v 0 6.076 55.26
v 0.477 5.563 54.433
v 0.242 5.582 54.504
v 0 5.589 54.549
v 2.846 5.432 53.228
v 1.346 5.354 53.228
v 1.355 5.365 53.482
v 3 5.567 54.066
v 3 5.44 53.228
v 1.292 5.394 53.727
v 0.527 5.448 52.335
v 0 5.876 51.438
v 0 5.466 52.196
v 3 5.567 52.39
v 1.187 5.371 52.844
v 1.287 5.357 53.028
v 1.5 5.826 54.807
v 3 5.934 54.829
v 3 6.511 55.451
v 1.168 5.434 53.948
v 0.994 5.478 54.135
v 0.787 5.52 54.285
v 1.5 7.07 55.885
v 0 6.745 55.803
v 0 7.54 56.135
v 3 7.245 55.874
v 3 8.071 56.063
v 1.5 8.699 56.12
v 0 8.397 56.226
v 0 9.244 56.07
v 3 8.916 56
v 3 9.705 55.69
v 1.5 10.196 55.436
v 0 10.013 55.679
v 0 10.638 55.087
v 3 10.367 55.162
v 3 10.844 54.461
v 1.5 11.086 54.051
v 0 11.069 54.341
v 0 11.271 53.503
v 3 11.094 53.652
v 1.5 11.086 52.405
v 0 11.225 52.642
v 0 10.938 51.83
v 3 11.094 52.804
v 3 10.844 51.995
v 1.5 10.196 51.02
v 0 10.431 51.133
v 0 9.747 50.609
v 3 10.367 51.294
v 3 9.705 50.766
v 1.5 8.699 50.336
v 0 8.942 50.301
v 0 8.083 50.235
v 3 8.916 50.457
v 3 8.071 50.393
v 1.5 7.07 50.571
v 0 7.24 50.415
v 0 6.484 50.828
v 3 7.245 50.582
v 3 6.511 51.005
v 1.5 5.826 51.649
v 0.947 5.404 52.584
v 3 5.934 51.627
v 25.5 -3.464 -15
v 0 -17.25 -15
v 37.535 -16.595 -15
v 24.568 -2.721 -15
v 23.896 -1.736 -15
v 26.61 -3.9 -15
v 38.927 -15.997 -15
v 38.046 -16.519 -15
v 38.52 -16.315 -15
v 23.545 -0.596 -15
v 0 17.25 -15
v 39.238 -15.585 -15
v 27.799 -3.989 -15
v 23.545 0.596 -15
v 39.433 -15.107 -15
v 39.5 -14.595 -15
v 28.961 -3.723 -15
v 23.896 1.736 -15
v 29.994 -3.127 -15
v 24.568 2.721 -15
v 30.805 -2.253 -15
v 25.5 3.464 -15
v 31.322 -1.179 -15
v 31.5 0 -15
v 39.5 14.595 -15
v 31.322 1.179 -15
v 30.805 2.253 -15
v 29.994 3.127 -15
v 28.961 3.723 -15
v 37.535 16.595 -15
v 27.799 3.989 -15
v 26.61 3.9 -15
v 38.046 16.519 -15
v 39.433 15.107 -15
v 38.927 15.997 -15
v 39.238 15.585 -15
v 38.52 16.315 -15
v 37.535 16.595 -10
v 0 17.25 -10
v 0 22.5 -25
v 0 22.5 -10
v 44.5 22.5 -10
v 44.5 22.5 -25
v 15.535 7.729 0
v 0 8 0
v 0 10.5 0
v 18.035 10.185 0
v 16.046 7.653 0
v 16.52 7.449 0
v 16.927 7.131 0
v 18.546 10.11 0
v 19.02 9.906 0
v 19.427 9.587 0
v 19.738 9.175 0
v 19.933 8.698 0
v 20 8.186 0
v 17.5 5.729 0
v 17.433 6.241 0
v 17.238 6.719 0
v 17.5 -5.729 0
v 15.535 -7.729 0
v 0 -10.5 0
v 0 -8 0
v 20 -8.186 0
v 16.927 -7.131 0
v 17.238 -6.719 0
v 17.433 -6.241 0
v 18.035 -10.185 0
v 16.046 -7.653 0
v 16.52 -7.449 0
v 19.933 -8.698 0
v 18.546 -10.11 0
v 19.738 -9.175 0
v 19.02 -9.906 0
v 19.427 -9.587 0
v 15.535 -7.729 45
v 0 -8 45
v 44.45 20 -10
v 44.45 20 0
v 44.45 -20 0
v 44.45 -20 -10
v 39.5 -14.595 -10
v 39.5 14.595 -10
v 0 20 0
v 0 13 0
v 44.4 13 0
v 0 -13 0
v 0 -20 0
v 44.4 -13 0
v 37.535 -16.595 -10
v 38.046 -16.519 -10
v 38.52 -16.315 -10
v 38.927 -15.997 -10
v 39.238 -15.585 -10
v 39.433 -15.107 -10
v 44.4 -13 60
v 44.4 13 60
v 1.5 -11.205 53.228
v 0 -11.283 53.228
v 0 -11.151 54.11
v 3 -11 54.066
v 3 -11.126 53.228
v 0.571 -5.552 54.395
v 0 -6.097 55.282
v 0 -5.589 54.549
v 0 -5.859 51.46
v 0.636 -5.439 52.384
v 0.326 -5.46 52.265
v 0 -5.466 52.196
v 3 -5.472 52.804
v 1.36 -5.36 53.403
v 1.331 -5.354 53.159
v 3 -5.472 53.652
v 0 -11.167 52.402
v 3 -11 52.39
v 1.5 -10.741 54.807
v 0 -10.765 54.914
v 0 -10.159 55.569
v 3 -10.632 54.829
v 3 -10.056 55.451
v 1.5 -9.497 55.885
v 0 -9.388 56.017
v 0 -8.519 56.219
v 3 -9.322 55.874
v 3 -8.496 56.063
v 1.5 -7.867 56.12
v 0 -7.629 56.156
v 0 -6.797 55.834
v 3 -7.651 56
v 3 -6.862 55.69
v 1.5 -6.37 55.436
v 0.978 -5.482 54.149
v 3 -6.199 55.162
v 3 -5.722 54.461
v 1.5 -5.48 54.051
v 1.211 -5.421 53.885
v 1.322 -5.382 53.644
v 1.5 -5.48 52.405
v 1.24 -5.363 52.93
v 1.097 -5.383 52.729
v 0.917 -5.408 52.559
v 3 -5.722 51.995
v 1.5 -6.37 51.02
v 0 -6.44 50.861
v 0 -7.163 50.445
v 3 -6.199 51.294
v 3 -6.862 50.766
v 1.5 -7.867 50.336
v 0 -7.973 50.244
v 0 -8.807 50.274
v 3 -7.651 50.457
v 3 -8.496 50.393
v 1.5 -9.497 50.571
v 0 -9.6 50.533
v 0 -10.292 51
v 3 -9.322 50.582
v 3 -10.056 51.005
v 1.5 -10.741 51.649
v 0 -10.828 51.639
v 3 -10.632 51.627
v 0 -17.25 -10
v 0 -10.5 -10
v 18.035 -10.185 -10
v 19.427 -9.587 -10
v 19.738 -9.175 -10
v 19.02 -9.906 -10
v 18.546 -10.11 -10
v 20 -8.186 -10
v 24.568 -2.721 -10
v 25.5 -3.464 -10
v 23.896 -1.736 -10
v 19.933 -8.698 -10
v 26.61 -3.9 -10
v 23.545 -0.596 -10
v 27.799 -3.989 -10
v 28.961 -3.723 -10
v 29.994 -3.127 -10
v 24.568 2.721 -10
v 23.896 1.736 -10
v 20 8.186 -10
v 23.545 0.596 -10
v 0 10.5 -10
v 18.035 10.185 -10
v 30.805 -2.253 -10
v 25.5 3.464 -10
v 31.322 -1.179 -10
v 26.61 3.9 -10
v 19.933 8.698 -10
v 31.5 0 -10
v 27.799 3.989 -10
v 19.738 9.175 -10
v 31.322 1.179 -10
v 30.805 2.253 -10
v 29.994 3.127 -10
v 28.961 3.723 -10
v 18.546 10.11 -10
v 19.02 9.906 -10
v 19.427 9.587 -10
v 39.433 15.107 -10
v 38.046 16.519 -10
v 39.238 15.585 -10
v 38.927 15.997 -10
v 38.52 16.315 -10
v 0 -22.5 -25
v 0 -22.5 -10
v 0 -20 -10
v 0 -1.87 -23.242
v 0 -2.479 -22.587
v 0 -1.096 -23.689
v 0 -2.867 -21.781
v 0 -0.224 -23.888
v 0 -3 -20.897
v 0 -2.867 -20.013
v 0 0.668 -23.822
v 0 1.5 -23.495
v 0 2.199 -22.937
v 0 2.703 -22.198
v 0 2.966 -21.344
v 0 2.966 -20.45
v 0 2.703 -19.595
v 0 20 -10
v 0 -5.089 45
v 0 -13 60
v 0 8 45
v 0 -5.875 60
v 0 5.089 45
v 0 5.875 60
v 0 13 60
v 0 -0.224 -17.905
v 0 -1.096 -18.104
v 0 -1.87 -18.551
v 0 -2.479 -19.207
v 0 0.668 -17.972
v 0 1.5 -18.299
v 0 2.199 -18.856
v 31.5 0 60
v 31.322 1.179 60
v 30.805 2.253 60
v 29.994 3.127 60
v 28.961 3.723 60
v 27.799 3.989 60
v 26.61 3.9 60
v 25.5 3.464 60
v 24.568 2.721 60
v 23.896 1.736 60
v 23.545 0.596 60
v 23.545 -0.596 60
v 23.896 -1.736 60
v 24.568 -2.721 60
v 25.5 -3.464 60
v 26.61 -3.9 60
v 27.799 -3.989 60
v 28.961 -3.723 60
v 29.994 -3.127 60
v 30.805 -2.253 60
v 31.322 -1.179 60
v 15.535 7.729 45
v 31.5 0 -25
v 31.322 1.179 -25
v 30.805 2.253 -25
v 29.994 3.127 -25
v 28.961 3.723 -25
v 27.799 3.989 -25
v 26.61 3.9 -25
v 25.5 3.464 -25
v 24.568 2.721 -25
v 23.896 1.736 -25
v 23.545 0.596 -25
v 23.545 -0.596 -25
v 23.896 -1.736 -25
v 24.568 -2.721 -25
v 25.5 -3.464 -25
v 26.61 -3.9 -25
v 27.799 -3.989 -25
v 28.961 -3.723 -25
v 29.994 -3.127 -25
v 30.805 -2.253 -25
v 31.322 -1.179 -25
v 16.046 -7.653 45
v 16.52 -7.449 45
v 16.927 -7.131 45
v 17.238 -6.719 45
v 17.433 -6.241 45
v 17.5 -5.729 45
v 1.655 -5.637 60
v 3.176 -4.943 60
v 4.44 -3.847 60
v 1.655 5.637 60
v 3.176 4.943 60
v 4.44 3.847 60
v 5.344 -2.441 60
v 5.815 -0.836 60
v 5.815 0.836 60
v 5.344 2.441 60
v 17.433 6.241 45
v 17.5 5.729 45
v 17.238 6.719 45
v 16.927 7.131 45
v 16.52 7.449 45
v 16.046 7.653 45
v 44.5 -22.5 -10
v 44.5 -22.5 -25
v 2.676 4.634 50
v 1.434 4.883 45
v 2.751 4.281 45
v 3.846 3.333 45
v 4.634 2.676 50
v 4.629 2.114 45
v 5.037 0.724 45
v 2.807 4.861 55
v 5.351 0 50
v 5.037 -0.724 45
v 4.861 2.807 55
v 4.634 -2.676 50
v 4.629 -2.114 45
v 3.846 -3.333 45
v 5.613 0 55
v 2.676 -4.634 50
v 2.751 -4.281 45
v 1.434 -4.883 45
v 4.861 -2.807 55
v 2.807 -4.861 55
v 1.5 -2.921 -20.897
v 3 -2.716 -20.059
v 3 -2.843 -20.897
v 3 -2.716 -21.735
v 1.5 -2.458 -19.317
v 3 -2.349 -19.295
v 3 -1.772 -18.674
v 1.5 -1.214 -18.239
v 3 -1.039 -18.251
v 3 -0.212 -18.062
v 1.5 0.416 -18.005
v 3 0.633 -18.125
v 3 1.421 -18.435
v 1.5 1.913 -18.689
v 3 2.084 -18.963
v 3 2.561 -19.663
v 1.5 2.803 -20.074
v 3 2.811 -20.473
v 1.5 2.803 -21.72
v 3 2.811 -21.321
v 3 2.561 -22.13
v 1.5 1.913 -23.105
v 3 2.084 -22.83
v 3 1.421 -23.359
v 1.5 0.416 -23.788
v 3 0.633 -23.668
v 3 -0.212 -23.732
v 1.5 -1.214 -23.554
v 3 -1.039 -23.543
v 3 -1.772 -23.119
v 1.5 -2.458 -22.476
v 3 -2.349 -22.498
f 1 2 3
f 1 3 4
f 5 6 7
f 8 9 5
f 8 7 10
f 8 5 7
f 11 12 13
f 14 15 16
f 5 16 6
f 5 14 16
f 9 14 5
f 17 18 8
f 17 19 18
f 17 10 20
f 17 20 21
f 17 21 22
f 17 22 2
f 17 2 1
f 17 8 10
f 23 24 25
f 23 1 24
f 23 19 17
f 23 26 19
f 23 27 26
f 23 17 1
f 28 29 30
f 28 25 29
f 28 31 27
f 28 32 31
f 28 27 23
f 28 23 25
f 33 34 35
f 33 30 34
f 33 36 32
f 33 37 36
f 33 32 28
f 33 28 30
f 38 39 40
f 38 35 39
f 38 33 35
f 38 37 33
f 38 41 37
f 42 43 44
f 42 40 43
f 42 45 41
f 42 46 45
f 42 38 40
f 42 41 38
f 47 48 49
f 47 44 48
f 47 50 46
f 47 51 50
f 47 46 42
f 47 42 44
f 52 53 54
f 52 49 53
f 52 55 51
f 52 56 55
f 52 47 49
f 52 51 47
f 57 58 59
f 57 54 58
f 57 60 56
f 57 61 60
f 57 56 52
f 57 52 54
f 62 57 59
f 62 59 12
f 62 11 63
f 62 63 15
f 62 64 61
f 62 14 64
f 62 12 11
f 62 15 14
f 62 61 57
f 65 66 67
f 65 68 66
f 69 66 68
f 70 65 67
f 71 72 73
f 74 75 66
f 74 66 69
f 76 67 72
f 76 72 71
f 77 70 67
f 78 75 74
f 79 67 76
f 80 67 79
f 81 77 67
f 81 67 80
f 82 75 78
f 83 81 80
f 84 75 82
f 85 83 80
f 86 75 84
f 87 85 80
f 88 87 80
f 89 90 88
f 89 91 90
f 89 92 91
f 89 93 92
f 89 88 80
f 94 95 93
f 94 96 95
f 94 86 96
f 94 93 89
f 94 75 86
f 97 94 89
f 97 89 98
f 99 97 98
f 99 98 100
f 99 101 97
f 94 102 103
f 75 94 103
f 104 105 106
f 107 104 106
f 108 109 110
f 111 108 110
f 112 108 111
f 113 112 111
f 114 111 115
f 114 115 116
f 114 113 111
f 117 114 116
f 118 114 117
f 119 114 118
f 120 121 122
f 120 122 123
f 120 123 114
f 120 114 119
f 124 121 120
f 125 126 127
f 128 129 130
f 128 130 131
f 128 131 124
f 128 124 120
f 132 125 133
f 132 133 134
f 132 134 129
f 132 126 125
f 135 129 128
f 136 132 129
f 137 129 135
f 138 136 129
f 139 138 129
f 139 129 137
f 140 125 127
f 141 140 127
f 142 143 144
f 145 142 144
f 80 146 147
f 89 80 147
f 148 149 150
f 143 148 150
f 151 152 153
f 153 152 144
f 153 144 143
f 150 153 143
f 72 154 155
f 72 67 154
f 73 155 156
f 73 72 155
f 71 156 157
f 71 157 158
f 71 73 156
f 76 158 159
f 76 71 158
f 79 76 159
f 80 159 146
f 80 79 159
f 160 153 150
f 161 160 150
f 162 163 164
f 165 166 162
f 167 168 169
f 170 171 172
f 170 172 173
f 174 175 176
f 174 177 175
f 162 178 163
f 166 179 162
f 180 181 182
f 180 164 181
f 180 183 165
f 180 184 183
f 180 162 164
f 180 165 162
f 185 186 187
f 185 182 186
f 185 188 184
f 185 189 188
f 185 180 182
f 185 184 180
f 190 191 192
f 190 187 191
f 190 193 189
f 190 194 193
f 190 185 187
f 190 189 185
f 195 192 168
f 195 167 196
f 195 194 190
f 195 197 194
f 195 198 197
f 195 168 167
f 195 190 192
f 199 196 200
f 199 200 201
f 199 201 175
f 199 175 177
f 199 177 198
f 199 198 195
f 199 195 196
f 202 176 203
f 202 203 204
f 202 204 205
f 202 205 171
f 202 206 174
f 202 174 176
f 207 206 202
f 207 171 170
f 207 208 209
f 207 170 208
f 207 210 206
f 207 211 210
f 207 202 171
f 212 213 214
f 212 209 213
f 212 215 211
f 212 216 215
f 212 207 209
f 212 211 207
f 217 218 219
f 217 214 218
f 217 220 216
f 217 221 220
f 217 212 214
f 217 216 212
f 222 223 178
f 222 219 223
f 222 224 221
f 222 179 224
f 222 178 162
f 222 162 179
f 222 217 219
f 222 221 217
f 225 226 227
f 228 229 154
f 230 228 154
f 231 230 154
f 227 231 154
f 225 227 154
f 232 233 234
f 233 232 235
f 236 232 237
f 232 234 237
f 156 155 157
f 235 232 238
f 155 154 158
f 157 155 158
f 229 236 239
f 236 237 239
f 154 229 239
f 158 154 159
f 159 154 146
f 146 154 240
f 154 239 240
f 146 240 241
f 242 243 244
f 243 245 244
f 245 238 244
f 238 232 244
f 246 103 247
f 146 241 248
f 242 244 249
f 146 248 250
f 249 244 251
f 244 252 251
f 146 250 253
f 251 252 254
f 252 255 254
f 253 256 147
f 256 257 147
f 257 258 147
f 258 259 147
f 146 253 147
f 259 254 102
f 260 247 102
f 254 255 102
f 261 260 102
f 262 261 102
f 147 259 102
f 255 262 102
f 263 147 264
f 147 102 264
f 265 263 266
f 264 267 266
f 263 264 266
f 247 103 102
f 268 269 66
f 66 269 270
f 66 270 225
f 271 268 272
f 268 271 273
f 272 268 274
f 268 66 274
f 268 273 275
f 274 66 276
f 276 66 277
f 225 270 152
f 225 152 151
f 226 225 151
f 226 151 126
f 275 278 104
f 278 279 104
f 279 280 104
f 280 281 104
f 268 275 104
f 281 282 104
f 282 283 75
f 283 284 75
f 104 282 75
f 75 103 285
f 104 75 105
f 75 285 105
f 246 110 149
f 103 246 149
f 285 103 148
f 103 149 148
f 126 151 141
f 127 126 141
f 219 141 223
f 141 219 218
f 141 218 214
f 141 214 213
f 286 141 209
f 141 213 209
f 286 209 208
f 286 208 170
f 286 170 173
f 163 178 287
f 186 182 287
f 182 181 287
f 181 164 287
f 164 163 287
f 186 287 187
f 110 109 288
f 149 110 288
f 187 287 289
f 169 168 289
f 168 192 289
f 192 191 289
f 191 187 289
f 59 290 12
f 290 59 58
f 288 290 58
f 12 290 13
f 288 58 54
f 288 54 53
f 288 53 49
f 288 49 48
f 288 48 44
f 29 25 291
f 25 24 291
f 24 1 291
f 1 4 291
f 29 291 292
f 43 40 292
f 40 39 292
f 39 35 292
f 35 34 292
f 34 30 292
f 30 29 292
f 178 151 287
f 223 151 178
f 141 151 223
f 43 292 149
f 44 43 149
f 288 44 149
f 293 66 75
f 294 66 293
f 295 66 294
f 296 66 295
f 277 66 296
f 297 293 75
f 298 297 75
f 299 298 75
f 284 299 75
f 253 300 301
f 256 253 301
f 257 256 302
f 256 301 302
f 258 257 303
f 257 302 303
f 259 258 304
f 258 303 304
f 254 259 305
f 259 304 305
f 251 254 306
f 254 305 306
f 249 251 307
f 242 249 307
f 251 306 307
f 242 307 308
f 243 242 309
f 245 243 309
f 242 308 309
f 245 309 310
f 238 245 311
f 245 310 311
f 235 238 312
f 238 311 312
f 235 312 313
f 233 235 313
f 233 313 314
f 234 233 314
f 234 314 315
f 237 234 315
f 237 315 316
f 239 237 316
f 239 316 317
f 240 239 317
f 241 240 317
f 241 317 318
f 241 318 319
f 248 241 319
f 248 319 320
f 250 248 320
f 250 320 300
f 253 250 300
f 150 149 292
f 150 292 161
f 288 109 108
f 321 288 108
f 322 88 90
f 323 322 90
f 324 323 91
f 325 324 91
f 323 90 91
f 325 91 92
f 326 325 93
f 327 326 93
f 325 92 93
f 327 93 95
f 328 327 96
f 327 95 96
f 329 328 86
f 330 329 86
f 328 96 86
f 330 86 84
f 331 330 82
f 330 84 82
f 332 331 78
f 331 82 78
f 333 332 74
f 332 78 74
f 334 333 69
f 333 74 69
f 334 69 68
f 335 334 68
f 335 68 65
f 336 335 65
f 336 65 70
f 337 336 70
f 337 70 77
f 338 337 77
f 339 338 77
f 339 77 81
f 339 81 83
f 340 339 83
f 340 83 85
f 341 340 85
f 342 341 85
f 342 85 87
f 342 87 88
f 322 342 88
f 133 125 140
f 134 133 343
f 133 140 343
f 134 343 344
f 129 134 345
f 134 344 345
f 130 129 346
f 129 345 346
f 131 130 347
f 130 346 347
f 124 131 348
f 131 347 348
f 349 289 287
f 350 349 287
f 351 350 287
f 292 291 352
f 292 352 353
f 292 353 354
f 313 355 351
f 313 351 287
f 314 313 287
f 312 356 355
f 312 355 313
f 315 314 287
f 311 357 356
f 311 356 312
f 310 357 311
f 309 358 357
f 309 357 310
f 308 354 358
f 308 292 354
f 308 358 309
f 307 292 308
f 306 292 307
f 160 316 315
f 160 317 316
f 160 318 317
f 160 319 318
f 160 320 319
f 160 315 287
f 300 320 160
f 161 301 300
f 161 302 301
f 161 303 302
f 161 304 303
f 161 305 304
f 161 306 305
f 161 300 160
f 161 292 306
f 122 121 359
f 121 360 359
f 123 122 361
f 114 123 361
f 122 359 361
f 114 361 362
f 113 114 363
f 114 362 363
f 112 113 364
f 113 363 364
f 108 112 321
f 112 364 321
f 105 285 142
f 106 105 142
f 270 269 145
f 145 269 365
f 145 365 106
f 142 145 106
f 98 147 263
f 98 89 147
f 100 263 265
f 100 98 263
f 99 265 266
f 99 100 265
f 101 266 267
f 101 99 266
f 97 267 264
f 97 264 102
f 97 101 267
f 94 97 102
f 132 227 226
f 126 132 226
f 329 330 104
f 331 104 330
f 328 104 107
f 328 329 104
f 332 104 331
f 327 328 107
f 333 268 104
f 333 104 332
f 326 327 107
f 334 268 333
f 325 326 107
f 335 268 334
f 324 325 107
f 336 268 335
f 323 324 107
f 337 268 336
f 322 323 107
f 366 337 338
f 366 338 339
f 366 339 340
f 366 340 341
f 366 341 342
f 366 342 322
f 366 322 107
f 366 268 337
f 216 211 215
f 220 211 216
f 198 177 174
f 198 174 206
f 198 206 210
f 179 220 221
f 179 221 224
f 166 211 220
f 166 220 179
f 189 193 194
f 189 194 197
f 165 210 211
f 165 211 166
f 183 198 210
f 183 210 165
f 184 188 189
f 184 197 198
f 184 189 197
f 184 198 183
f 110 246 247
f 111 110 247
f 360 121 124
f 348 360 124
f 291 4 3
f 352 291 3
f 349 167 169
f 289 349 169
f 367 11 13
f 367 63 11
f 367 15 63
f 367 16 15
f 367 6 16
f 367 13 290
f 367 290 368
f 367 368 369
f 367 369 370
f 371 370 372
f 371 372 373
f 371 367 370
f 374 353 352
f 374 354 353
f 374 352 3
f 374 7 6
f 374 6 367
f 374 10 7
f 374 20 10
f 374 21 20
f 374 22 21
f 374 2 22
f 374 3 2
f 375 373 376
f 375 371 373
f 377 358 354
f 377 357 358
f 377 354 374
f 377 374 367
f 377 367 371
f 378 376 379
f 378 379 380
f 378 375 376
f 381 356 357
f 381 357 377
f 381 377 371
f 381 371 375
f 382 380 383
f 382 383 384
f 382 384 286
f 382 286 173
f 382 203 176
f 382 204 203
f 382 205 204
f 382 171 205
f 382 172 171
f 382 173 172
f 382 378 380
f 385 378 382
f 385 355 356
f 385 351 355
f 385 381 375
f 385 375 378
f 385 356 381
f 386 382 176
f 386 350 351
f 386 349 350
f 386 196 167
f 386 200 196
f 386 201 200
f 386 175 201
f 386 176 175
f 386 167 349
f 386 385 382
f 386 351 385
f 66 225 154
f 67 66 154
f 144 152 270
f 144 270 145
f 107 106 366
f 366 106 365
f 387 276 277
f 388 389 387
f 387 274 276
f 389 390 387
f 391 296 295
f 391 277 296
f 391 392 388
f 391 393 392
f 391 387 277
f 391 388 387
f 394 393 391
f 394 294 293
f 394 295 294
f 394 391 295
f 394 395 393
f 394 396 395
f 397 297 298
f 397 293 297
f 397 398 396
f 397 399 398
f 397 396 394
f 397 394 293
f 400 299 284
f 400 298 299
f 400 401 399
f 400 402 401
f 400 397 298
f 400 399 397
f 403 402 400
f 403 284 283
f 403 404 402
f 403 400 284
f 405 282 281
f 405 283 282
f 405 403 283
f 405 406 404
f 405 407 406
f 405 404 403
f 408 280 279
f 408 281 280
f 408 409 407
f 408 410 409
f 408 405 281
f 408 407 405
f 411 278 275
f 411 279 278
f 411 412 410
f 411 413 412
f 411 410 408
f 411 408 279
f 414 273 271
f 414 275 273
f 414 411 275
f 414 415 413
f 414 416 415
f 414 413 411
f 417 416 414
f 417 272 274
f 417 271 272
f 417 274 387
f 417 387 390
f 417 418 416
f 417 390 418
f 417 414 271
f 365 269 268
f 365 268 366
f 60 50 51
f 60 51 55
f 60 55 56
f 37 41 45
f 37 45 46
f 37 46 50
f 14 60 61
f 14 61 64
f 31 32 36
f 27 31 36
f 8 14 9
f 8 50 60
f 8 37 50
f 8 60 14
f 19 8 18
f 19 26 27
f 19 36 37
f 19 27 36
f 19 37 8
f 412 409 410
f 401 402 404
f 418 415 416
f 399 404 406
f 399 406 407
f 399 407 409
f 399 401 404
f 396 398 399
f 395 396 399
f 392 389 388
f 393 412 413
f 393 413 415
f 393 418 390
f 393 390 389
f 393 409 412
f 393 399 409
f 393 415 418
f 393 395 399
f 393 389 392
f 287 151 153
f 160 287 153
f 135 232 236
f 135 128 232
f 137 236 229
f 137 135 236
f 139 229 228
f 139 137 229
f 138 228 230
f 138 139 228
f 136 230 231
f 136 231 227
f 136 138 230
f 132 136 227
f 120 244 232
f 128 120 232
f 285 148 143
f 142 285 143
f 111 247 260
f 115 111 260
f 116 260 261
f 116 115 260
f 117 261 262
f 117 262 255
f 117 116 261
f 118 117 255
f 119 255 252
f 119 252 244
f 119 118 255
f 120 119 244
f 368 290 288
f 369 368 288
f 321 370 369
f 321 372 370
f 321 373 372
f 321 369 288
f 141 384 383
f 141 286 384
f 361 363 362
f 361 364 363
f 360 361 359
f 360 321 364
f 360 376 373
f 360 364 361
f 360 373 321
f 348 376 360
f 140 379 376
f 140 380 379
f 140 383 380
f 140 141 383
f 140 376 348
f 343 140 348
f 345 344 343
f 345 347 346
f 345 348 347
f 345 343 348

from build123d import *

# Parameters (mm, degrees)
F0_W      = 88.8
F0_H      = 26
F1_DEPTH  = 60
F3_DEPTH  = 45
F4_R      = 2
F5_W      = 88.9
F5_H      = 40
F6_DEPTH  = 10
F8_DEPTH  = 10
F9_R      = 2
F10_W     = 89
F10_H     = 45
F11_DEPTH = 15
F13_DEPTH = 5
F14_R     = 2
F15_R     = 4.6723110677
F15_R_2   = 4
F16_DEPTH = 85.001
F17_W     = 79.5239582658
F17_H     = 118.802215904
F18_DEPTH = 80
F19_R     = 3
F20_DEPTH = 3
F20_TAPER = -3
F21_DEPTH = 3
F21_TAPER = 3
F22_R     = 5.0890490665
F23_DEPTH = 25
F23_TAPER = -3


with BuildPart() as f1:
    # F0 (on Top) → F1 (new body)
    with BuildSketch(Plane.XY):
        Rectangle(F0_W, F0_H)
    extrude(amount=F1_DEPTH)

    # F2 (on face) → F3 (cut)
    with BuildSketch(Plane(origin=(0, 0, 0), x_dir=(1, 0, 0), z_dir=(0, 0, -1))):
        Polygon((-17.5, -7.6945363638), (0, -8), (17.5, -7.6945363638), (17.5, 7.6945363638), (0, 8), (-17.5, 7.6945363638), align=None)
    extrude(amount=-F3_DEPTH, mode=Mode.SUBTRACT)

    # F4
    f4_edges = [f1.edges().sort_by_distance(p)[0] for p in [
        (-17.5, 7.694536, 22.5),
        (-17.5, -7.694536, 22.5),
        (17.5, -7.694536, 22.5),
        (17.5, 7.694536, 22.5),
    ]]
    fillet(f4_edges, radius=F4_R)

    # F5 (on face) → F6 (join)
    with BuildSketch(Plane(origin=(0, 0, 0), x_dir=(1, 0, 0), z_dir=(0, 0, -1))):
        Rectangle(F5_W, F5_H)
    extrude(amount=F6_DEPTH)

    # F7 (on face) → F8 (cut)
    with BuildSketch(Plane(origin=(0, 0, -10), x_dir=(1, 0, 0), z_dir=(0, 0, -1))):
        Polygon((-20, -10.1508987014), (0, -10.5), (20, -10.1508987014), (20, 10.1508987014), (0, 10.5), (-20, 10.1508987014), align=None)
    extrude(amount=-F8_DEPTH, mode=Mode.SUBTRACT)

    # F9
    f9_edges = [f1.edges().sort_by_distance(p)[0] for p in [
        (-20, 10.150899, -5),
        (-20, -10.150899, -5),
        (20, 10.150899, -5),
        (20, -10.150899, -5),
    ]]
    fillet(f9_edges, radius=F9_R)

    # F10 (on face) → F11 (join)
    with BuildSketch(Plane(origin=(0, 0, -10), x_dir=(1, 0, 0), z_dir=(0, 0, -1))):
        Rectangle(F10_W, F10_H)
    extrude(amount=F11_DEPTH)

    # F12 (on face) → F13 (cut)
    with BuildSketch(Plane.XY.offset(-10)):
        Polygon((-39.5, -16.5605249353), (0, -17.25), (39.5, -16.5605249353), (39.5, 16.5605249353), (0, 17.25), (-39.5, 16.5605249353), align=None)
    extrude(amount=-F13_DEPTH, mode=Mode.SUBTRACT)

    # F14
    f14_edges = [f1.edges().sort_by_distance(p)[0] for p in [
        (-39.5, 16.560525, -12.5),
        (-39.5, -16.560525, -12.5),
        (39.5, -16.560525, -12.5),
        (39.5, 16.560525, -12.5),
    ]]
    fillet(f14_edges, radius=F14_R)

    # F15 (on face) → F16 (cut, through all)
    with BuildSketch(Plane.XY.offset(60)):
        with Locations((-27.5, 0)):
            Circle(F15_R)
        with Locations((27.5, 0)):
            Circle(F15_R_2)
    extrude(amount=-F16_DEPTH, mode=Mode.SUBTRACT)

    # F17 (on Right) → F18 (cut)
    with BuildSketch(Plane.YZ):
        with Locations((3.9665214717, 9.8679382354)):
            Rectangle(F17_W, F17_H)
    extrude(amount=-F18_DEPTH, mode=Mode.SUBTRACT)

    # F19 (on face) → F20 (join)
    with BuildSketch(Plane(origin=(0, 0, 0), x_dir=(0, -1, 0), z_dir=(-1, 0, 0))):
        with Locations((8.2831978798, 53.2280467451)):
            Circle(F19_R)
        with Locations((0, -20.896807313)):
            Circle(F19_R)
        with Locations((-8.2831978798, 53.2280467451)):
            Circle(F19_R)
    extrude(amount=-F20_DEPTH, taper=F20_TAPER)

    # F19 (on face) → F21 (cut)
    with BuildSketch(Plane(origin=(0, 0, 0), x_dir=(0, -1, 0), z_dir=(-1, 0, 0))):
        with Locations((8.2831978798, 53.2280467451)):
            Circle(F19_R)
        with Locations((0, -20.896807313)):
            Circle(F19_R)
        with Locations((-8.2831978798, 53.2280467451)):
            Circle(F19_R)
    extrude(amount=-F21_DEPTH, taper=F21_TAPER, mode=Mode.SUBTRACT)

    # F22 (on face) → F23 (cut)
    with BuildSketch(Plane(origin=(0, 0, 45), x_dir=(1, 0, 0), z_dir=(0, 0, -1))):
        Circle(F22_R)
    extrude(amount=-F23_DEPTH, taper=F23_TAPER, mode=Mode.SUBTRACT)


solid = f1.part
